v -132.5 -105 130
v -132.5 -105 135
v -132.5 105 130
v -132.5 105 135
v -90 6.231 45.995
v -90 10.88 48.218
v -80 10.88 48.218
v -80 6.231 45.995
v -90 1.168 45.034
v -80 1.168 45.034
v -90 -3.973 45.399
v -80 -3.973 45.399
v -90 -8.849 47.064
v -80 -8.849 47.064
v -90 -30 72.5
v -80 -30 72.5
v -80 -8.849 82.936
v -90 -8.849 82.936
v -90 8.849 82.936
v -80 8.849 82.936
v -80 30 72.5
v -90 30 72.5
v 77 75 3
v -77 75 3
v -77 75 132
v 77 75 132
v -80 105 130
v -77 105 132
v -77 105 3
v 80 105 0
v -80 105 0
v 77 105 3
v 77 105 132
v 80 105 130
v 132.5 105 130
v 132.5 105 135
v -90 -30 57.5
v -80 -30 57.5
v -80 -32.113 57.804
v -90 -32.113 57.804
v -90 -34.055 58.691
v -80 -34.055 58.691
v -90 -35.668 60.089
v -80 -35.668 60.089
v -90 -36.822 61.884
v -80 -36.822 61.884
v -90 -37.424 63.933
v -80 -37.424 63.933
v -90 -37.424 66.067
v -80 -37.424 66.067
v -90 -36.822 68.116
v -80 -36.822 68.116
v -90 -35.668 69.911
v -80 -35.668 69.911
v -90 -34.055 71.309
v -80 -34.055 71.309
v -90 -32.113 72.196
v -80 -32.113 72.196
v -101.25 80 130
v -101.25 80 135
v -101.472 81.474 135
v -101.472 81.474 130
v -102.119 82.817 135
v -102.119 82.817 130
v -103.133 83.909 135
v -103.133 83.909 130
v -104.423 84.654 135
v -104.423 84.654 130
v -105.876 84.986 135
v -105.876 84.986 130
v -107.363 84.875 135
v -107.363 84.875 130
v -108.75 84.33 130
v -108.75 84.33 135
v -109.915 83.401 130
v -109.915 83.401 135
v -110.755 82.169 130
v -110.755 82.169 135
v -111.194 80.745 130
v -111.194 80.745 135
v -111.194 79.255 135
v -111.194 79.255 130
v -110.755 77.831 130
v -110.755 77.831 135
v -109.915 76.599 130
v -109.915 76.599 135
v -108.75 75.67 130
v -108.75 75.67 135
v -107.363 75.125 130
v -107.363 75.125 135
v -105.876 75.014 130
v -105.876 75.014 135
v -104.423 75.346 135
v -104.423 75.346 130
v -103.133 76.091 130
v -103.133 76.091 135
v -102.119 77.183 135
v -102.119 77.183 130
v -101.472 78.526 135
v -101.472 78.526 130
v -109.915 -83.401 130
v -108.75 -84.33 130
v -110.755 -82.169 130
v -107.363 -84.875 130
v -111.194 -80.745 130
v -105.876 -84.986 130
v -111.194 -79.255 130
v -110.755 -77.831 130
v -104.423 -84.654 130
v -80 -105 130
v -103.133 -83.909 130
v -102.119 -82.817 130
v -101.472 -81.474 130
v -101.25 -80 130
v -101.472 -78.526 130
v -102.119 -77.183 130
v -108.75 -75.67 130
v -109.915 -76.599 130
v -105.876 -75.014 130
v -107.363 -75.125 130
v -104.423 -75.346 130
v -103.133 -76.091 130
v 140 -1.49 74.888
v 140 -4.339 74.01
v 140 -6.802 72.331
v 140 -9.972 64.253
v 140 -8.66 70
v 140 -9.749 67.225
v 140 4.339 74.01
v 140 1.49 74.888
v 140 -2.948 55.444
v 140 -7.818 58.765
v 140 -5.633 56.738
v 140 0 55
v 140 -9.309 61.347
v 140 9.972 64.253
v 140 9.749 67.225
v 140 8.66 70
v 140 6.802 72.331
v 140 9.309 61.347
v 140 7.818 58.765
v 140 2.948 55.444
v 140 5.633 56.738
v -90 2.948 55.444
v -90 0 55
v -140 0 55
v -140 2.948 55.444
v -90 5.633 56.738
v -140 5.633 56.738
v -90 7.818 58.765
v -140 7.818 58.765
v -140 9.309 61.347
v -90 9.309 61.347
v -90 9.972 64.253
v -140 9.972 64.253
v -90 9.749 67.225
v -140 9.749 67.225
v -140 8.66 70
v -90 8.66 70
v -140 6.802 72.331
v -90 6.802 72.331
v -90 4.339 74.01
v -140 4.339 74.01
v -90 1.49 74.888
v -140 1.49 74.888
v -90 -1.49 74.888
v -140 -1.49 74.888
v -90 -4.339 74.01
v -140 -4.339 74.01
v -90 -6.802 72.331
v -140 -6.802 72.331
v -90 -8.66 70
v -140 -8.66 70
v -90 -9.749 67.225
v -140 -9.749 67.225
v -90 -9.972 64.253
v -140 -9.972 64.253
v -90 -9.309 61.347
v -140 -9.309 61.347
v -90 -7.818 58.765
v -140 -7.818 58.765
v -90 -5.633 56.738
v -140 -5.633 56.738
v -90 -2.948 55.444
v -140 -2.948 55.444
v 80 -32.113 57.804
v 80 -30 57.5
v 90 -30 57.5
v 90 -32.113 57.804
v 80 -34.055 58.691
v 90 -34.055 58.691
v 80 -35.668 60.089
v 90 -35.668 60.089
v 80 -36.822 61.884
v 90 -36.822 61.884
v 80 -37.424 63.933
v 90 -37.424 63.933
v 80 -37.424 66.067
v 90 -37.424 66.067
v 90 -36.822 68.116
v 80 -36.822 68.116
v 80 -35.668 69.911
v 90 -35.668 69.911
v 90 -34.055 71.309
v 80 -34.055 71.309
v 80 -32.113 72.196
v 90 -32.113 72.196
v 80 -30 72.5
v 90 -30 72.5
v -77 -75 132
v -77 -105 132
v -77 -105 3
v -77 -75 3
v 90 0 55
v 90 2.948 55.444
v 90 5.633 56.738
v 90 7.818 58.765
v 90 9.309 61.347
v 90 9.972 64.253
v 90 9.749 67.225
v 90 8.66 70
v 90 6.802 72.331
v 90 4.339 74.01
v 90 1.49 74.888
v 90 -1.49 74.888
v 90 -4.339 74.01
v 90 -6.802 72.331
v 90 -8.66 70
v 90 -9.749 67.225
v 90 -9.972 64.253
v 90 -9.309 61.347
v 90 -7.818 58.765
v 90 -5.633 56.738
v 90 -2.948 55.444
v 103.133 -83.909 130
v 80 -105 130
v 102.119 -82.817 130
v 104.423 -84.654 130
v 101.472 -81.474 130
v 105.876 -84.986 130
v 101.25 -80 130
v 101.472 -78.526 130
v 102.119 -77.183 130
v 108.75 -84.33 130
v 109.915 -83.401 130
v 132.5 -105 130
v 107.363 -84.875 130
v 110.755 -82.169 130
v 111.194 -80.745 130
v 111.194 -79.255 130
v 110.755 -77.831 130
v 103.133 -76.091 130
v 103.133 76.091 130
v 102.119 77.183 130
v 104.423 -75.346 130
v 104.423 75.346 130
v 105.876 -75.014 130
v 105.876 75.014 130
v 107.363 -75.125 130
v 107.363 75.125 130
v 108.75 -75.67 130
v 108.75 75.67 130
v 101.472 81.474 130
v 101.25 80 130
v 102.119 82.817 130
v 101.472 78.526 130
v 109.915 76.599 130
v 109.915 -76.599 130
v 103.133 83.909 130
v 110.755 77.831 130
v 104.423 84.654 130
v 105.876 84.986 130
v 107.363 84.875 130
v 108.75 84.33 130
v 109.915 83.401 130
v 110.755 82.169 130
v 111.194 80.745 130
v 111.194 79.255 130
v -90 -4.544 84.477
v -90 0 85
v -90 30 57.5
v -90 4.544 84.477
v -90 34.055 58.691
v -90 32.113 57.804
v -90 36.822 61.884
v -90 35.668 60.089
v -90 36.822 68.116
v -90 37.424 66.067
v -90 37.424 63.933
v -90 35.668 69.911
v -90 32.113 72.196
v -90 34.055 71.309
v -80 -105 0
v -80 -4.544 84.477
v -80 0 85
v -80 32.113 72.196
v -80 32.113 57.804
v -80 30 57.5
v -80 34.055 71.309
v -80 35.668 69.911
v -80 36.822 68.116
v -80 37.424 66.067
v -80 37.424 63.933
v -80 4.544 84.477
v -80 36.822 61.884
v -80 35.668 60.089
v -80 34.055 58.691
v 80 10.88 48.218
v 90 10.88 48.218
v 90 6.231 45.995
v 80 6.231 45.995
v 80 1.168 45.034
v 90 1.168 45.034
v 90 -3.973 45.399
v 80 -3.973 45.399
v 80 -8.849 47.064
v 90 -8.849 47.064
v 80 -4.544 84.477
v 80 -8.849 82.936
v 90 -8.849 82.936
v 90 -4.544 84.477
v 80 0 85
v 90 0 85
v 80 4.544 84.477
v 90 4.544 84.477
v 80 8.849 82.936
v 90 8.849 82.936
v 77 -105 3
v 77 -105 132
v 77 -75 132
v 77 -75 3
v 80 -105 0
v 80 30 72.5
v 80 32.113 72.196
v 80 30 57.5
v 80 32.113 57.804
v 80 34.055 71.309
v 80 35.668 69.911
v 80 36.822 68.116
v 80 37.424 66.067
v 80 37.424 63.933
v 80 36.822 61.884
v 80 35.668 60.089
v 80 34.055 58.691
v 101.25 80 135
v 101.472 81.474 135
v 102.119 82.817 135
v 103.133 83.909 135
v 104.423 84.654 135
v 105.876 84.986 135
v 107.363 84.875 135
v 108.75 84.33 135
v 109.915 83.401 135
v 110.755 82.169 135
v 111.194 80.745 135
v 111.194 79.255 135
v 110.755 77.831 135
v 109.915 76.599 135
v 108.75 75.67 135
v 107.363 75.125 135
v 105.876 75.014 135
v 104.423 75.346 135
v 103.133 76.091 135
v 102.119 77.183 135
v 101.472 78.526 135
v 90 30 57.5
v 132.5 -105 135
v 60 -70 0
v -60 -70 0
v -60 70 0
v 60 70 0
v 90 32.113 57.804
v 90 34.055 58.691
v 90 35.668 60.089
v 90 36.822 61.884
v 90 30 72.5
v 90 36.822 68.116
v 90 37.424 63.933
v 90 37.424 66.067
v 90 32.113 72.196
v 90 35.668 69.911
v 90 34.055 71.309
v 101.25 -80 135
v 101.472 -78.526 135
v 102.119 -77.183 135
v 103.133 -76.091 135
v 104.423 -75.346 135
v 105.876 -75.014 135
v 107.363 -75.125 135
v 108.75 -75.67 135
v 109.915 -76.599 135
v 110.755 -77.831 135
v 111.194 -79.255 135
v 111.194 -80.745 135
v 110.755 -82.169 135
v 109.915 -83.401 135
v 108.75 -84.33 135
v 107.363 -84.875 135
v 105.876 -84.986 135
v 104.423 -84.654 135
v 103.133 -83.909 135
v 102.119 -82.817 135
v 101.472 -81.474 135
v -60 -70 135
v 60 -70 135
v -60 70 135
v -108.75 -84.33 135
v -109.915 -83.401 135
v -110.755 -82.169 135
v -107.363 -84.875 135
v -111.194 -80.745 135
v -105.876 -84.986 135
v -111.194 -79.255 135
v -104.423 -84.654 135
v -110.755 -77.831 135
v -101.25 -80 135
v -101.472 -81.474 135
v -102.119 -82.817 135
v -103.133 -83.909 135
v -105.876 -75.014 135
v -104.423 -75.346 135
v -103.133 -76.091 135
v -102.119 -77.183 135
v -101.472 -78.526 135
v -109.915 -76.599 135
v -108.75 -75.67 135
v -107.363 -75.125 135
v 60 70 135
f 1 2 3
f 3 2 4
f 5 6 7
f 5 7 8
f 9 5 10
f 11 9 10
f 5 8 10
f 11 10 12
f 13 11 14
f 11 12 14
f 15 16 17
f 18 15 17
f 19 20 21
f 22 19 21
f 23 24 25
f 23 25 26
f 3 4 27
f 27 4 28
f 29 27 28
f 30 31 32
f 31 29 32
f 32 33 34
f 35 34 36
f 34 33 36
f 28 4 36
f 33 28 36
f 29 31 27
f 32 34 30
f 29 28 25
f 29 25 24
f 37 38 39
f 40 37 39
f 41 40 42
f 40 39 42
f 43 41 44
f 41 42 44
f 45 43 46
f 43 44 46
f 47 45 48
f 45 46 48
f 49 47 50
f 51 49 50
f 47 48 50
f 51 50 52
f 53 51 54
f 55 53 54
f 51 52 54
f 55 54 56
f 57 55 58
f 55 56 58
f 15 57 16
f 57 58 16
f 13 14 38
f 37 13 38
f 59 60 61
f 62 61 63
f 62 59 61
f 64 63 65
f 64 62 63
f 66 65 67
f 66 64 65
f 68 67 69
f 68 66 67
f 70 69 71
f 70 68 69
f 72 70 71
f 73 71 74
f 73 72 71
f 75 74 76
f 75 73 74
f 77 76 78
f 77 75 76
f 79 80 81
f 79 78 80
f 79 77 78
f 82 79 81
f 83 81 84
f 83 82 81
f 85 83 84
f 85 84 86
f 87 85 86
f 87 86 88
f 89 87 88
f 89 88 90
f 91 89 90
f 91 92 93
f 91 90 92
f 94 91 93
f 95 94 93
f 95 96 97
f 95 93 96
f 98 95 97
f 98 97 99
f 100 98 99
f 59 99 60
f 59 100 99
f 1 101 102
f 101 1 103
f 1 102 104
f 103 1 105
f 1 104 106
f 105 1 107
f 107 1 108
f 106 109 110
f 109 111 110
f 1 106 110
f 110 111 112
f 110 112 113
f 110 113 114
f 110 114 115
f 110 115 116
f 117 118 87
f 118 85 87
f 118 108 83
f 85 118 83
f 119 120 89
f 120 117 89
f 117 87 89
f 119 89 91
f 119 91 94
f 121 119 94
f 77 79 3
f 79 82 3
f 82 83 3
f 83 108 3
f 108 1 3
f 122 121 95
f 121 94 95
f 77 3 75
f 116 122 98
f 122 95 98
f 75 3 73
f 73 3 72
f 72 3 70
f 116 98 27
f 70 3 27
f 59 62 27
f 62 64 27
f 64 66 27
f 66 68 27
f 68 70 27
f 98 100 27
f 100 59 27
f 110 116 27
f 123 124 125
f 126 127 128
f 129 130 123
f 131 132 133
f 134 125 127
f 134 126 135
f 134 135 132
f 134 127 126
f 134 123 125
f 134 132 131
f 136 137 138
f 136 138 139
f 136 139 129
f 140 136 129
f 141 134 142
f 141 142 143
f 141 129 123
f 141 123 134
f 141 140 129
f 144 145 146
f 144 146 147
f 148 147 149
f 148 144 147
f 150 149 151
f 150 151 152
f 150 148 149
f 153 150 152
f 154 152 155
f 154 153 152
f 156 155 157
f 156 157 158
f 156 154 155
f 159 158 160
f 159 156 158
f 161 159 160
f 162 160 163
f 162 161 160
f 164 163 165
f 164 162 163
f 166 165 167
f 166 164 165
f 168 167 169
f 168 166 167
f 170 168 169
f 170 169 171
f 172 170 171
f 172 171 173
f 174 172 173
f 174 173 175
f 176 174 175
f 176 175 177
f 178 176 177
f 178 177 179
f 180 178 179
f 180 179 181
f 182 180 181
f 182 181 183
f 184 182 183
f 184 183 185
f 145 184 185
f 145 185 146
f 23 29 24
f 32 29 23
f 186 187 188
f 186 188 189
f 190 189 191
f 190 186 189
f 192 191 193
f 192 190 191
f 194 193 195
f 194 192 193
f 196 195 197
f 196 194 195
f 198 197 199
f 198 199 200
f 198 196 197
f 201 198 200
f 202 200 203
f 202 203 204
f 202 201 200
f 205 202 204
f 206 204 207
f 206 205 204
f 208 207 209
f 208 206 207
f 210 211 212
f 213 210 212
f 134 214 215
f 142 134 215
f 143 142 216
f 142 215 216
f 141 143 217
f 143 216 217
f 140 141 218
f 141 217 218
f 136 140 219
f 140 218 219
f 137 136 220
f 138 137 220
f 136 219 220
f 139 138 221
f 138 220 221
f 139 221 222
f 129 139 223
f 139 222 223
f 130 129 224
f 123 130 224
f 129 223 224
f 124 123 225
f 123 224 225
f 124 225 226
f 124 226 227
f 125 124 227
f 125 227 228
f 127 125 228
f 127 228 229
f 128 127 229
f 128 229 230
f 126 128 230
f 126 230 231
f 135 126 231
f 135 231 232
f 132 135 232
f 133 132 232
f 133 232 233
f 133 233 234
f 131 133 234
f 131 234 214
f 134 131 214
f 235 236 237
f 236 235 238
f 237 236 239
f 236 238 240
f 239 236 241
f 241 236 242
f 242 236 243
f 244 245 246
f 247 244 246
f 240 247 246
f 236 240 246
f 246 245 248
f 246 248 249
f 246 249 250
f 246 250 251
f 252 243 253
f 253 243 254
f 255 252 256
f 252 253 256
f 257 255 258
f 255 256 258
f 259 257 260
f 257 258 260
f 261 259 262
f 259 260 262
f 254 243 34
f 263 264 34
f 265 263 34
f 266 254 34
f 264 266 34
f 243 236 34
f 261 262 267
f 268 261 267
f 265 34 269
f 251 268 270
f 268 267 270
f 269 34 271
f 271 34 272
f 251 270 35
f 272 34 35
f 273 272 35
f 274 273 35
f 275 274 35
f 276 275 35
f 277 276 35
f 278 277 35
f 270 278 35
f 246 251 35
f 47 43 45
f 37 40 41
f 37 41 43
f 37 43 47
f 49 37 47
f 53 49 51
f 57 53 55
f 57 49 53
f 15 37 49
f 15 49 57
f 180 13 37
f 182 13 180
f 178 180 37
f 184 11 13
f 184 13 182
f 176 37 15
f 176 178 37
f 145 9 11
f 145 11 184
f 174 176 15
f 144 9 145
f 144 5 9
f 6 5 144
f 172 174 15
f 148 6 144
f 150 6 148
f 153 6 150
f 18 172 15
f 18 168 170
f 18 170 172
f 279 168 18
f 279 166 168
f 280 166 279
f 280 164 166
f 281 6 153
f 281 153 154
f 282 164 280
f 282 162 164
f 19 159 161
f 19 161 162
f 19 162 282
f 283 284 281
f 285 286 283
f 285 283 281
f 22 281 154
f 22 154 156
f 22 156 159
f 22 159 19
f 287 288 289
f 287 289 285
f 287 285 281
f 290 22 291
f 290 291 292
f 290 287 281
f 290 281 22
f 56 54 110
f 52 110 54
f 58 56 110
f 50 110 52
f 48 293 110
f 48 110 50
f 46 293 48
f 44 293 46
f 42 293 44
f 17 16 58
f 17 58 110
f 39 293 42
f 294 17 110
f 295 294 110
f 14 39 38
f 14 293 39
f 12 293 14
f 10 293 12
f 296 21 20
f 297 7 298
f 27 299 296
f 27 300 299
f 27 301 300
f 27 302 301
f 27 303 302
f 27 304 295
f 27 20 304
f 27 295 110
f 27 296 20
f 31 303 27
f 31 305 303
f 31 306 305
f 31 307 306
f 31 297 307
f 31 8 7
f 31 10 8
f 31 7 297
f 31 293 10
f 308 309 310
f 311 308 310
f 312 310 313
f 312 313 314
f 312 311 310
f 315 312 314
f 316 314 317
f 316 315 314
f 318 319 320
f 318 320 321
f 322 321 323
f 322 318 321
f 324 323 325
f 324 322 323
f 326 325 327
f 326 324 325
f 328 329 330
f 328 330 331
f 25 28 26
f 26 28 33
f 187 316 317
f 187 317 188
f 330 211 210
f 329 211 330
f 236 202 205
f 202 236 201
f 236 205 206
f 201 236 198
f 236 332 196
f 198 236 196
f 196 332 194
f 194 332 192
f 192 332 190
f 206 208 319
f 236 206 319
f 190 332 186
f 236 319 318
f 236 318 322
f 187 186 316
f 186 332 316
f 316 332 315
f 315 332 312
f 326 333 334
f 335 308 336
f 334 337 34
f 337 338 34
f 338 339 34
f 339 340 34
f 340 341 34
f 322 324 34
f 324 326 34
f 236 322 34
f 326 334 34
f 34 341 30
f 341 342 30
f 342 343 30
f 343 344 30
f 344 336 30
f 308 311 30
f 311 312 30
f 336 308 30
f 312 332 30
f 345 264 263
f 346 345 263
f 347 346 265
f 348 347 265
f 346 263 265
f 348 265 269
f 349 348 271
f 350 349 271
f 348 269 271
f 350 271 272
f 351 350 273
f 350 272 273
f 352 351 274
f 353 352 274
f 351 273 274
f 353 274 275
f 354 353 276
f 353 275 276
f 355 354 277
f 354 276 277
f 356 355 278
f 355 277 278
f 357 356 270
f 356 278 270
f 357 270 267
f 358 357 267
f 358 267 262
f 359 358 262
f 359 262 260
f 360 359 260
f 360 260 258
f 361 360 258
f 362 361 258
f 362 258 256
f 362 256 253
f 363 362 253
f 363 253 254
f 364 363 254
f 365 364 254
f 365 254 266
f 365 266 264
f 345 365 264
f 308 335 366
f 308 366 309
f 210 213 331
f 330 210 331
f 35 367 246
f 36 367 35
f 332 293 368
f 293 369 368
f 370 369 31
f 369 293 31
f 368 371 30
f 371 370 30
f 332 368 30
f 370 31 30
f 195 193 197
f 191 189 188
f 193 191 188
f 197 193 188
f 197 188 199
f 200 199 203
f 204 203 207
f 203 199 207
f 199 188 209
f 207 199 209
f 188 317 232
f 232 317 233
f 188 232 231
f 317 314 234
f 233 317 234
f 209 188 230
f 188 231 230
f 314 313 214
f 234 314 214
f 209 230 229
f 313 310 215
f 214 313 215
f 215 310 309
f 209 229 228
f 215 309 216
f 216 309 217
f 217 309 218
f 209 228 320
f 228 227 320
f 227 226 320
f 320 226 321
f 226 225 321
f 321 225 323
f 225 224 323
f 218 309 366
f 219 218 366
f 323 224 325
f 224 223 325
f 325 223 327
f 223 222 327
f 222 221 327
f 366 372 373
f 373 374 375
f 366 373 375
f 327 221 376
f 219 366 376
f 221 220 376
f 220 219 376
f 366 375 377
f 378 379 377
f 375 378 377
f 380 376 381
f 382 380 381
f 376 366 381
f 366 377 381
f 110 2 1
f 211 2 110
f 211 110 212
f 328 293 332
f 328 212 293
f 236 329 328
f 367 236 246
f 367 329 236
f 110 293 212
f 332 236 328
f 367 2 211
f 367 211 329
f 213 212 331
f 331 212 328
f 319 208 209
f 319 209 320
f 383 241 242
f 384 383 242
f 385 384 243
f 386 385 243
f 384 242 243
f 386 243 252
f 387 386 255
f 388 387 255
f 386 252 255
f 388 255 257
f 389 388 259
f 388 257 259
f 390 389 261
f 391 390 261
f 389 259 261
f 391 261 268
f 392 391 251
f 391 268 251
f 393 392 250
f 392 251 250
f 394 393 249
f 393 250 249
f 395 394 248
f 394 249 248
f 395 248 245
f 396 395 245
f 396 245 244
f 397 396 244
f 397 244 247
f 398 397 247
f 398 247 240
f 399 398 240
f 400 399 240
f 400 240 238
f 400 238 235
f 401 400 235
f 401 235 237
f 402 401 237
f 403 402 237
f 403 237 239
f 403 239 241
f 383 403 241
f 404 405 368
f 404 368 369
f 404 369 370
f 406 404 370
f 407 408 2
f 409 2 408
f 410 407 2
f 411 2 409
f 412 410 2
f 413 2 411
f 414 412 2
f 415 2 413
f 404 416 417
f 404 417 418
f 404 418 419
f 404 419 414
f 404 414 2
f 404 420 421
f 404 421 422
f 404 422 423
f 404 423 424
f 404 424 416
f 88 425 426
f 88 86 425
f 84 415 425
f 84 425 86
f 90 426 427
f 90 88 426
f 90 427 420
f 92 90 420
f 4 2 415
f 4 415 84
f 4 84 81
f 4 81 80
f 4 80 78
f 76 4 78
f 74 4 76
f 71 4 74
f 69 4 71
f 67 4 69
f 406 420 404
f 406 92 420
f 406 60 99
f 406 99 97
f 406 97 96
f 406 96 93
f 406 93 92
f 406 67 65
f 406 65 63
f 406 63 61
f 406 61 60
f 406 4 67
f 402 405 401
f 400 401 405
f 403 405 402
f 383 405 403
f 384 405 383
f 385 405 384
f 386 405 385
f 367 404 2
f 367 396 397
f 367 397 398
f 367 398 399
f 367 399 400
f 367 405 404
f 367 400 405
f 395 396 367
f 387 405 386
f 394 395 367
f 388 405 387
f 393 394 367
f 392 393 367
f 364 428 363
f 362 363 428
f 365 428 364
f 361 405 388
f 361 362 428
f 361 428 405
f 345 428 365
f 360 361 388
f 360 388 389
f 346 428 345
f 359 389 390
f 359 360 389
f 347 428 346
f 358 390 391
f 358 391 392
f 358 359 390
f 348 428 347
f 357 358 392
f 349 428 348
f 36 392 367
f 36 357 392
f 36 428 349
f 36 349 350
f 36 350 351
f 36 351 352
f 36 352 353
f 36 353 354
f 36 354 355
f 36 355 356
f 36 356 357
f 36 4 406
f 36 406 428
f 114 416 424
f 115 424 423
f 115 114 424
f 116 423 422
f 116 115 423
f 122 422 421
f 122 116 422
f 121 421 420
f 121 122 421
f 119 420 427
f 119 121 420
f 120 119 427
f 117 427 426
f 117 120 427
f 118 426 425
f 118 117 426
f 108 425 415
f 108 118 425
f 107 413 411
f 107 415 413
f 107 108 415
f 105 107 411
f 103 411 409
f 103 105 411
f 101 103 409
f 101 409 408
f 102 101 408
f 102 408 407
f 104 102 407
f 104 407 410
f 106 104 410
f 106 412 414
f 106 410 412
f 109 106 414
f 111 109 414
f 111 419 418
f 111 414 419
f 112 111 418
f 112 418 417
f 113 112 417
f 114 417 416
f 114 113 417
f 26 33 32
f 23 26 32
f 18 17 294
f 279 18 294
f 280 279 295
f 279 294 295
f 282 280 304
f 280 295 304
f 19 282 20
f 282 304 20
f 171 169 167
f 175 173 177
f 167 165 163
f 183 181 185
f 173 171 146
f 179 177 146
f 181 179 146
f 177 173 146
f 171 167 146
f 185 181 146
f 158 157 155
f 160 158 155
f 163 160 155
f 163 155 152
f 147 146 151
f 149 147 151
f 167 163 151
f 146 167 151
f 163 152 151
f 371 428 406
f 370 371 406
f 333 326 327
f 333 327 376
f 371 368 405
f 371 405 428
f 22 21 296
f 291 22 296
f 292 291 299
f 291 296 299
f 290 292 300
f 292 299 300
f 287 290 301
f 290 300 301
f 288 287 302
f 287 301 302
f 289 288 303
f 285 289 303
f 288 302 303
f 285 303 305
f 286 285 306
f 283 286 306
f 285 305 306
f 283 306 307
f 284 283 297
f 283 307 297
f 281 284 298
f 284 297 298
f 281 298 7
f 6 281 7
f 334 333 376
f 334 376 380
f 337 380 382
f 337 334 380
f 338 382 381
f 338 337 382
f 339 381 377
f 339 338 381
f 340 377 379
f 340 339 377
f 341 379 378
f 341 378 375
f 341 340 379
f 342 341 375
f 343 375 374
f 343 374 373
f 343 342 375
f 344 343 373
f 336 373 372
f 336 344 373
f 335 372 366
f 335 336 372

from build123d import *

# Parameters (mm, degrees)
ESQUISSE1_W             = 160
ESQUISSE1_H             = 210
BOSS_EXTRU_1_DEPTH      = 135
ESQUISSE2_W             = 265
ESQUISSE2_H             = 210
BOSS_EXTRU_2_DEPTH      = 5
ESQUISSE4_R             = 10
BOSS_EXTRU_3_DEPTH      = 60
BOSS_EXTRU_4_DEPTH      = 10
ESQUISSE6_W             = 154
ESQUISSE6_H             = 129
ENL_V_MAT_EXTRU_2_DEPTH = 30
ESQUISSE7_W             = 120
ESQUISSE7_H             = 140
ENL_V_MAT_EXTRU_3_DEPTH = 150
ESQUISSE9_R             = 5
ENL_V_MAT_EXTRU_4_DEPTH = 150


with BuildPart() as part:
    # Esquisse1 → Boss.-Extru.1 (new body)
    with BuildSketch(Plane.XY):
        Rectangle(ESQUISSE1_W, ESQUISSE1_H)
    extrude(amount=BOSS_EXTRU_1_DEPTH)

    # Esquisse2 → Boss.-Extru.2 (add)
    with BuildSketch(Plane.XY.offset(135)):
        Rectangle(ESQUISSE2_W, ESQUISSE2_H)
    extrude(amount=-BOSS_EXTRU_2_DEPTH)

    # Esquisse4 → Boss.-Extru.3 (add)
    with BuildSketch(Plane(origin=(80, 0, 0), x_dir=(0, 0, -1), z_dir=(1, 0, 0))):
        with Locations((-65, 0)):
            Circle(ESQUISSE4_R)
    boss_extru_3 = extrude(amount=BOSS_EXTRU_3_DEPTH)

    # Symétrie1: Boss.-Extru.3 across plane
    add(boss_extru_3.mirror(Plane(origin=(0, 0, 0), x_dir=(0, 0, 1), z_dir=(1, 0, 0))))

    # Esquisse5 → Boss.-Extru.4 (add)
    with BuildSketch(Plane(origin=(80, 0, 0), x_dir=(0, 0, -1), z_dir=(1, 0, 0))):
        with BuildLine():
            Line((-57.5, 30), (-48.218390917, 10.8801469))
            ThreePointArc((-48.218390917, 10.8801469), (-45.034127123, 1.167869962), (-47.064343322, -8.849419164))
            Line((-47.064343322, -8.849419164), (-57.5, -30))
            ThreePointArc((-57.5, -30), (-65, -37.5), (-72.5, -30))
            Line((-72.5, -30), (-82.935656678, -8.849419164))
            ThreePointArc((-82.935656678, -8.849419164), (-85, 0), (-82.935656678, 8.849419164))
            Line((-82.935656678, 8.849419164), (-72.5, 30))
            ThreePointArc((-72.5, 30), (-65, 37.5), (-57.5, 30))
        make_face()
    boss_extru_4 = extrude(amount=BOSS_EXTRU_4_DEPTH)

    # Symétrie2: Boss.-Extru.4 across plane
    add(boss_extru_4.mirror(Plane(origin=(0, 0, 0), x_dir=(0, 0, 1), z_dir=(1, 0, 0))))

    # Esquisse6 → Enlèv. mat.-Extru.2 (cut)
    with BuildSketch(Plane(origin=(0, 105, 0), x_dir=(1, 0, 0), z_dir=(0, 1, 0))):
        with Locations((0, -67.5)):
            Rectangle(ESQUISSE6_W, ESQUISSE6_H)
    enl_v_mat_extru_2 = extrude(amount=-ENL_V_MAT_EXTRU_2_DEPTH, mode=Mode.SUBTRACT)

    # Symétrie3: Enlèv. mat.-Extru.2 across plane
    add(enl_v_mat_extru_2.mirror(Plane.ZX), mode=Mode.SUBTRACT)

    # Esquisse7 → Enlèv. mat.-Extru.3 (cut)
    with BuildSketch(Plane(origin=(0, 0, 0), x_dir=(-1, 0, 0), z_dir=(0, 0, -1))):
        Rectangle(ESQUISSE7_W, ESQUISSE7_H)
    extrude(amount=-ENL_V_MAT_EXTRU_3_DEPTH, mode=Mode.SUBTRACT)

    # Esquisse9 → Enlèv. mat.-Extru.4 (cut)
    with BuildSketch(Plane(origin=(0, 0, 130), x_dir=(-1, 0, 0), z_dir=(0, 0, -1))):
        with Locations((-106.25, 80)):
            Circle(ESQUISSE9_R)
        with Locations((-106.25, -80)):
            Circle(ESQUISSE9_R)
    enl_v_mat_extru_4 = extrude(amount=-ENL_V_MAT_EXTRU_4_DEPTH, mode=Mode.SUBTRACT)

    # Symétrie4: Enlèv. mat.-Extru.4 across plane
    add(enl_v_mat_extru_4.mirror(Plane(origin=(0, 0, 0), x_dir=(0, 0, 1), z_dir=(1, 0, 0))), mode=Mode.SUBTRACT)


solid = part.part
